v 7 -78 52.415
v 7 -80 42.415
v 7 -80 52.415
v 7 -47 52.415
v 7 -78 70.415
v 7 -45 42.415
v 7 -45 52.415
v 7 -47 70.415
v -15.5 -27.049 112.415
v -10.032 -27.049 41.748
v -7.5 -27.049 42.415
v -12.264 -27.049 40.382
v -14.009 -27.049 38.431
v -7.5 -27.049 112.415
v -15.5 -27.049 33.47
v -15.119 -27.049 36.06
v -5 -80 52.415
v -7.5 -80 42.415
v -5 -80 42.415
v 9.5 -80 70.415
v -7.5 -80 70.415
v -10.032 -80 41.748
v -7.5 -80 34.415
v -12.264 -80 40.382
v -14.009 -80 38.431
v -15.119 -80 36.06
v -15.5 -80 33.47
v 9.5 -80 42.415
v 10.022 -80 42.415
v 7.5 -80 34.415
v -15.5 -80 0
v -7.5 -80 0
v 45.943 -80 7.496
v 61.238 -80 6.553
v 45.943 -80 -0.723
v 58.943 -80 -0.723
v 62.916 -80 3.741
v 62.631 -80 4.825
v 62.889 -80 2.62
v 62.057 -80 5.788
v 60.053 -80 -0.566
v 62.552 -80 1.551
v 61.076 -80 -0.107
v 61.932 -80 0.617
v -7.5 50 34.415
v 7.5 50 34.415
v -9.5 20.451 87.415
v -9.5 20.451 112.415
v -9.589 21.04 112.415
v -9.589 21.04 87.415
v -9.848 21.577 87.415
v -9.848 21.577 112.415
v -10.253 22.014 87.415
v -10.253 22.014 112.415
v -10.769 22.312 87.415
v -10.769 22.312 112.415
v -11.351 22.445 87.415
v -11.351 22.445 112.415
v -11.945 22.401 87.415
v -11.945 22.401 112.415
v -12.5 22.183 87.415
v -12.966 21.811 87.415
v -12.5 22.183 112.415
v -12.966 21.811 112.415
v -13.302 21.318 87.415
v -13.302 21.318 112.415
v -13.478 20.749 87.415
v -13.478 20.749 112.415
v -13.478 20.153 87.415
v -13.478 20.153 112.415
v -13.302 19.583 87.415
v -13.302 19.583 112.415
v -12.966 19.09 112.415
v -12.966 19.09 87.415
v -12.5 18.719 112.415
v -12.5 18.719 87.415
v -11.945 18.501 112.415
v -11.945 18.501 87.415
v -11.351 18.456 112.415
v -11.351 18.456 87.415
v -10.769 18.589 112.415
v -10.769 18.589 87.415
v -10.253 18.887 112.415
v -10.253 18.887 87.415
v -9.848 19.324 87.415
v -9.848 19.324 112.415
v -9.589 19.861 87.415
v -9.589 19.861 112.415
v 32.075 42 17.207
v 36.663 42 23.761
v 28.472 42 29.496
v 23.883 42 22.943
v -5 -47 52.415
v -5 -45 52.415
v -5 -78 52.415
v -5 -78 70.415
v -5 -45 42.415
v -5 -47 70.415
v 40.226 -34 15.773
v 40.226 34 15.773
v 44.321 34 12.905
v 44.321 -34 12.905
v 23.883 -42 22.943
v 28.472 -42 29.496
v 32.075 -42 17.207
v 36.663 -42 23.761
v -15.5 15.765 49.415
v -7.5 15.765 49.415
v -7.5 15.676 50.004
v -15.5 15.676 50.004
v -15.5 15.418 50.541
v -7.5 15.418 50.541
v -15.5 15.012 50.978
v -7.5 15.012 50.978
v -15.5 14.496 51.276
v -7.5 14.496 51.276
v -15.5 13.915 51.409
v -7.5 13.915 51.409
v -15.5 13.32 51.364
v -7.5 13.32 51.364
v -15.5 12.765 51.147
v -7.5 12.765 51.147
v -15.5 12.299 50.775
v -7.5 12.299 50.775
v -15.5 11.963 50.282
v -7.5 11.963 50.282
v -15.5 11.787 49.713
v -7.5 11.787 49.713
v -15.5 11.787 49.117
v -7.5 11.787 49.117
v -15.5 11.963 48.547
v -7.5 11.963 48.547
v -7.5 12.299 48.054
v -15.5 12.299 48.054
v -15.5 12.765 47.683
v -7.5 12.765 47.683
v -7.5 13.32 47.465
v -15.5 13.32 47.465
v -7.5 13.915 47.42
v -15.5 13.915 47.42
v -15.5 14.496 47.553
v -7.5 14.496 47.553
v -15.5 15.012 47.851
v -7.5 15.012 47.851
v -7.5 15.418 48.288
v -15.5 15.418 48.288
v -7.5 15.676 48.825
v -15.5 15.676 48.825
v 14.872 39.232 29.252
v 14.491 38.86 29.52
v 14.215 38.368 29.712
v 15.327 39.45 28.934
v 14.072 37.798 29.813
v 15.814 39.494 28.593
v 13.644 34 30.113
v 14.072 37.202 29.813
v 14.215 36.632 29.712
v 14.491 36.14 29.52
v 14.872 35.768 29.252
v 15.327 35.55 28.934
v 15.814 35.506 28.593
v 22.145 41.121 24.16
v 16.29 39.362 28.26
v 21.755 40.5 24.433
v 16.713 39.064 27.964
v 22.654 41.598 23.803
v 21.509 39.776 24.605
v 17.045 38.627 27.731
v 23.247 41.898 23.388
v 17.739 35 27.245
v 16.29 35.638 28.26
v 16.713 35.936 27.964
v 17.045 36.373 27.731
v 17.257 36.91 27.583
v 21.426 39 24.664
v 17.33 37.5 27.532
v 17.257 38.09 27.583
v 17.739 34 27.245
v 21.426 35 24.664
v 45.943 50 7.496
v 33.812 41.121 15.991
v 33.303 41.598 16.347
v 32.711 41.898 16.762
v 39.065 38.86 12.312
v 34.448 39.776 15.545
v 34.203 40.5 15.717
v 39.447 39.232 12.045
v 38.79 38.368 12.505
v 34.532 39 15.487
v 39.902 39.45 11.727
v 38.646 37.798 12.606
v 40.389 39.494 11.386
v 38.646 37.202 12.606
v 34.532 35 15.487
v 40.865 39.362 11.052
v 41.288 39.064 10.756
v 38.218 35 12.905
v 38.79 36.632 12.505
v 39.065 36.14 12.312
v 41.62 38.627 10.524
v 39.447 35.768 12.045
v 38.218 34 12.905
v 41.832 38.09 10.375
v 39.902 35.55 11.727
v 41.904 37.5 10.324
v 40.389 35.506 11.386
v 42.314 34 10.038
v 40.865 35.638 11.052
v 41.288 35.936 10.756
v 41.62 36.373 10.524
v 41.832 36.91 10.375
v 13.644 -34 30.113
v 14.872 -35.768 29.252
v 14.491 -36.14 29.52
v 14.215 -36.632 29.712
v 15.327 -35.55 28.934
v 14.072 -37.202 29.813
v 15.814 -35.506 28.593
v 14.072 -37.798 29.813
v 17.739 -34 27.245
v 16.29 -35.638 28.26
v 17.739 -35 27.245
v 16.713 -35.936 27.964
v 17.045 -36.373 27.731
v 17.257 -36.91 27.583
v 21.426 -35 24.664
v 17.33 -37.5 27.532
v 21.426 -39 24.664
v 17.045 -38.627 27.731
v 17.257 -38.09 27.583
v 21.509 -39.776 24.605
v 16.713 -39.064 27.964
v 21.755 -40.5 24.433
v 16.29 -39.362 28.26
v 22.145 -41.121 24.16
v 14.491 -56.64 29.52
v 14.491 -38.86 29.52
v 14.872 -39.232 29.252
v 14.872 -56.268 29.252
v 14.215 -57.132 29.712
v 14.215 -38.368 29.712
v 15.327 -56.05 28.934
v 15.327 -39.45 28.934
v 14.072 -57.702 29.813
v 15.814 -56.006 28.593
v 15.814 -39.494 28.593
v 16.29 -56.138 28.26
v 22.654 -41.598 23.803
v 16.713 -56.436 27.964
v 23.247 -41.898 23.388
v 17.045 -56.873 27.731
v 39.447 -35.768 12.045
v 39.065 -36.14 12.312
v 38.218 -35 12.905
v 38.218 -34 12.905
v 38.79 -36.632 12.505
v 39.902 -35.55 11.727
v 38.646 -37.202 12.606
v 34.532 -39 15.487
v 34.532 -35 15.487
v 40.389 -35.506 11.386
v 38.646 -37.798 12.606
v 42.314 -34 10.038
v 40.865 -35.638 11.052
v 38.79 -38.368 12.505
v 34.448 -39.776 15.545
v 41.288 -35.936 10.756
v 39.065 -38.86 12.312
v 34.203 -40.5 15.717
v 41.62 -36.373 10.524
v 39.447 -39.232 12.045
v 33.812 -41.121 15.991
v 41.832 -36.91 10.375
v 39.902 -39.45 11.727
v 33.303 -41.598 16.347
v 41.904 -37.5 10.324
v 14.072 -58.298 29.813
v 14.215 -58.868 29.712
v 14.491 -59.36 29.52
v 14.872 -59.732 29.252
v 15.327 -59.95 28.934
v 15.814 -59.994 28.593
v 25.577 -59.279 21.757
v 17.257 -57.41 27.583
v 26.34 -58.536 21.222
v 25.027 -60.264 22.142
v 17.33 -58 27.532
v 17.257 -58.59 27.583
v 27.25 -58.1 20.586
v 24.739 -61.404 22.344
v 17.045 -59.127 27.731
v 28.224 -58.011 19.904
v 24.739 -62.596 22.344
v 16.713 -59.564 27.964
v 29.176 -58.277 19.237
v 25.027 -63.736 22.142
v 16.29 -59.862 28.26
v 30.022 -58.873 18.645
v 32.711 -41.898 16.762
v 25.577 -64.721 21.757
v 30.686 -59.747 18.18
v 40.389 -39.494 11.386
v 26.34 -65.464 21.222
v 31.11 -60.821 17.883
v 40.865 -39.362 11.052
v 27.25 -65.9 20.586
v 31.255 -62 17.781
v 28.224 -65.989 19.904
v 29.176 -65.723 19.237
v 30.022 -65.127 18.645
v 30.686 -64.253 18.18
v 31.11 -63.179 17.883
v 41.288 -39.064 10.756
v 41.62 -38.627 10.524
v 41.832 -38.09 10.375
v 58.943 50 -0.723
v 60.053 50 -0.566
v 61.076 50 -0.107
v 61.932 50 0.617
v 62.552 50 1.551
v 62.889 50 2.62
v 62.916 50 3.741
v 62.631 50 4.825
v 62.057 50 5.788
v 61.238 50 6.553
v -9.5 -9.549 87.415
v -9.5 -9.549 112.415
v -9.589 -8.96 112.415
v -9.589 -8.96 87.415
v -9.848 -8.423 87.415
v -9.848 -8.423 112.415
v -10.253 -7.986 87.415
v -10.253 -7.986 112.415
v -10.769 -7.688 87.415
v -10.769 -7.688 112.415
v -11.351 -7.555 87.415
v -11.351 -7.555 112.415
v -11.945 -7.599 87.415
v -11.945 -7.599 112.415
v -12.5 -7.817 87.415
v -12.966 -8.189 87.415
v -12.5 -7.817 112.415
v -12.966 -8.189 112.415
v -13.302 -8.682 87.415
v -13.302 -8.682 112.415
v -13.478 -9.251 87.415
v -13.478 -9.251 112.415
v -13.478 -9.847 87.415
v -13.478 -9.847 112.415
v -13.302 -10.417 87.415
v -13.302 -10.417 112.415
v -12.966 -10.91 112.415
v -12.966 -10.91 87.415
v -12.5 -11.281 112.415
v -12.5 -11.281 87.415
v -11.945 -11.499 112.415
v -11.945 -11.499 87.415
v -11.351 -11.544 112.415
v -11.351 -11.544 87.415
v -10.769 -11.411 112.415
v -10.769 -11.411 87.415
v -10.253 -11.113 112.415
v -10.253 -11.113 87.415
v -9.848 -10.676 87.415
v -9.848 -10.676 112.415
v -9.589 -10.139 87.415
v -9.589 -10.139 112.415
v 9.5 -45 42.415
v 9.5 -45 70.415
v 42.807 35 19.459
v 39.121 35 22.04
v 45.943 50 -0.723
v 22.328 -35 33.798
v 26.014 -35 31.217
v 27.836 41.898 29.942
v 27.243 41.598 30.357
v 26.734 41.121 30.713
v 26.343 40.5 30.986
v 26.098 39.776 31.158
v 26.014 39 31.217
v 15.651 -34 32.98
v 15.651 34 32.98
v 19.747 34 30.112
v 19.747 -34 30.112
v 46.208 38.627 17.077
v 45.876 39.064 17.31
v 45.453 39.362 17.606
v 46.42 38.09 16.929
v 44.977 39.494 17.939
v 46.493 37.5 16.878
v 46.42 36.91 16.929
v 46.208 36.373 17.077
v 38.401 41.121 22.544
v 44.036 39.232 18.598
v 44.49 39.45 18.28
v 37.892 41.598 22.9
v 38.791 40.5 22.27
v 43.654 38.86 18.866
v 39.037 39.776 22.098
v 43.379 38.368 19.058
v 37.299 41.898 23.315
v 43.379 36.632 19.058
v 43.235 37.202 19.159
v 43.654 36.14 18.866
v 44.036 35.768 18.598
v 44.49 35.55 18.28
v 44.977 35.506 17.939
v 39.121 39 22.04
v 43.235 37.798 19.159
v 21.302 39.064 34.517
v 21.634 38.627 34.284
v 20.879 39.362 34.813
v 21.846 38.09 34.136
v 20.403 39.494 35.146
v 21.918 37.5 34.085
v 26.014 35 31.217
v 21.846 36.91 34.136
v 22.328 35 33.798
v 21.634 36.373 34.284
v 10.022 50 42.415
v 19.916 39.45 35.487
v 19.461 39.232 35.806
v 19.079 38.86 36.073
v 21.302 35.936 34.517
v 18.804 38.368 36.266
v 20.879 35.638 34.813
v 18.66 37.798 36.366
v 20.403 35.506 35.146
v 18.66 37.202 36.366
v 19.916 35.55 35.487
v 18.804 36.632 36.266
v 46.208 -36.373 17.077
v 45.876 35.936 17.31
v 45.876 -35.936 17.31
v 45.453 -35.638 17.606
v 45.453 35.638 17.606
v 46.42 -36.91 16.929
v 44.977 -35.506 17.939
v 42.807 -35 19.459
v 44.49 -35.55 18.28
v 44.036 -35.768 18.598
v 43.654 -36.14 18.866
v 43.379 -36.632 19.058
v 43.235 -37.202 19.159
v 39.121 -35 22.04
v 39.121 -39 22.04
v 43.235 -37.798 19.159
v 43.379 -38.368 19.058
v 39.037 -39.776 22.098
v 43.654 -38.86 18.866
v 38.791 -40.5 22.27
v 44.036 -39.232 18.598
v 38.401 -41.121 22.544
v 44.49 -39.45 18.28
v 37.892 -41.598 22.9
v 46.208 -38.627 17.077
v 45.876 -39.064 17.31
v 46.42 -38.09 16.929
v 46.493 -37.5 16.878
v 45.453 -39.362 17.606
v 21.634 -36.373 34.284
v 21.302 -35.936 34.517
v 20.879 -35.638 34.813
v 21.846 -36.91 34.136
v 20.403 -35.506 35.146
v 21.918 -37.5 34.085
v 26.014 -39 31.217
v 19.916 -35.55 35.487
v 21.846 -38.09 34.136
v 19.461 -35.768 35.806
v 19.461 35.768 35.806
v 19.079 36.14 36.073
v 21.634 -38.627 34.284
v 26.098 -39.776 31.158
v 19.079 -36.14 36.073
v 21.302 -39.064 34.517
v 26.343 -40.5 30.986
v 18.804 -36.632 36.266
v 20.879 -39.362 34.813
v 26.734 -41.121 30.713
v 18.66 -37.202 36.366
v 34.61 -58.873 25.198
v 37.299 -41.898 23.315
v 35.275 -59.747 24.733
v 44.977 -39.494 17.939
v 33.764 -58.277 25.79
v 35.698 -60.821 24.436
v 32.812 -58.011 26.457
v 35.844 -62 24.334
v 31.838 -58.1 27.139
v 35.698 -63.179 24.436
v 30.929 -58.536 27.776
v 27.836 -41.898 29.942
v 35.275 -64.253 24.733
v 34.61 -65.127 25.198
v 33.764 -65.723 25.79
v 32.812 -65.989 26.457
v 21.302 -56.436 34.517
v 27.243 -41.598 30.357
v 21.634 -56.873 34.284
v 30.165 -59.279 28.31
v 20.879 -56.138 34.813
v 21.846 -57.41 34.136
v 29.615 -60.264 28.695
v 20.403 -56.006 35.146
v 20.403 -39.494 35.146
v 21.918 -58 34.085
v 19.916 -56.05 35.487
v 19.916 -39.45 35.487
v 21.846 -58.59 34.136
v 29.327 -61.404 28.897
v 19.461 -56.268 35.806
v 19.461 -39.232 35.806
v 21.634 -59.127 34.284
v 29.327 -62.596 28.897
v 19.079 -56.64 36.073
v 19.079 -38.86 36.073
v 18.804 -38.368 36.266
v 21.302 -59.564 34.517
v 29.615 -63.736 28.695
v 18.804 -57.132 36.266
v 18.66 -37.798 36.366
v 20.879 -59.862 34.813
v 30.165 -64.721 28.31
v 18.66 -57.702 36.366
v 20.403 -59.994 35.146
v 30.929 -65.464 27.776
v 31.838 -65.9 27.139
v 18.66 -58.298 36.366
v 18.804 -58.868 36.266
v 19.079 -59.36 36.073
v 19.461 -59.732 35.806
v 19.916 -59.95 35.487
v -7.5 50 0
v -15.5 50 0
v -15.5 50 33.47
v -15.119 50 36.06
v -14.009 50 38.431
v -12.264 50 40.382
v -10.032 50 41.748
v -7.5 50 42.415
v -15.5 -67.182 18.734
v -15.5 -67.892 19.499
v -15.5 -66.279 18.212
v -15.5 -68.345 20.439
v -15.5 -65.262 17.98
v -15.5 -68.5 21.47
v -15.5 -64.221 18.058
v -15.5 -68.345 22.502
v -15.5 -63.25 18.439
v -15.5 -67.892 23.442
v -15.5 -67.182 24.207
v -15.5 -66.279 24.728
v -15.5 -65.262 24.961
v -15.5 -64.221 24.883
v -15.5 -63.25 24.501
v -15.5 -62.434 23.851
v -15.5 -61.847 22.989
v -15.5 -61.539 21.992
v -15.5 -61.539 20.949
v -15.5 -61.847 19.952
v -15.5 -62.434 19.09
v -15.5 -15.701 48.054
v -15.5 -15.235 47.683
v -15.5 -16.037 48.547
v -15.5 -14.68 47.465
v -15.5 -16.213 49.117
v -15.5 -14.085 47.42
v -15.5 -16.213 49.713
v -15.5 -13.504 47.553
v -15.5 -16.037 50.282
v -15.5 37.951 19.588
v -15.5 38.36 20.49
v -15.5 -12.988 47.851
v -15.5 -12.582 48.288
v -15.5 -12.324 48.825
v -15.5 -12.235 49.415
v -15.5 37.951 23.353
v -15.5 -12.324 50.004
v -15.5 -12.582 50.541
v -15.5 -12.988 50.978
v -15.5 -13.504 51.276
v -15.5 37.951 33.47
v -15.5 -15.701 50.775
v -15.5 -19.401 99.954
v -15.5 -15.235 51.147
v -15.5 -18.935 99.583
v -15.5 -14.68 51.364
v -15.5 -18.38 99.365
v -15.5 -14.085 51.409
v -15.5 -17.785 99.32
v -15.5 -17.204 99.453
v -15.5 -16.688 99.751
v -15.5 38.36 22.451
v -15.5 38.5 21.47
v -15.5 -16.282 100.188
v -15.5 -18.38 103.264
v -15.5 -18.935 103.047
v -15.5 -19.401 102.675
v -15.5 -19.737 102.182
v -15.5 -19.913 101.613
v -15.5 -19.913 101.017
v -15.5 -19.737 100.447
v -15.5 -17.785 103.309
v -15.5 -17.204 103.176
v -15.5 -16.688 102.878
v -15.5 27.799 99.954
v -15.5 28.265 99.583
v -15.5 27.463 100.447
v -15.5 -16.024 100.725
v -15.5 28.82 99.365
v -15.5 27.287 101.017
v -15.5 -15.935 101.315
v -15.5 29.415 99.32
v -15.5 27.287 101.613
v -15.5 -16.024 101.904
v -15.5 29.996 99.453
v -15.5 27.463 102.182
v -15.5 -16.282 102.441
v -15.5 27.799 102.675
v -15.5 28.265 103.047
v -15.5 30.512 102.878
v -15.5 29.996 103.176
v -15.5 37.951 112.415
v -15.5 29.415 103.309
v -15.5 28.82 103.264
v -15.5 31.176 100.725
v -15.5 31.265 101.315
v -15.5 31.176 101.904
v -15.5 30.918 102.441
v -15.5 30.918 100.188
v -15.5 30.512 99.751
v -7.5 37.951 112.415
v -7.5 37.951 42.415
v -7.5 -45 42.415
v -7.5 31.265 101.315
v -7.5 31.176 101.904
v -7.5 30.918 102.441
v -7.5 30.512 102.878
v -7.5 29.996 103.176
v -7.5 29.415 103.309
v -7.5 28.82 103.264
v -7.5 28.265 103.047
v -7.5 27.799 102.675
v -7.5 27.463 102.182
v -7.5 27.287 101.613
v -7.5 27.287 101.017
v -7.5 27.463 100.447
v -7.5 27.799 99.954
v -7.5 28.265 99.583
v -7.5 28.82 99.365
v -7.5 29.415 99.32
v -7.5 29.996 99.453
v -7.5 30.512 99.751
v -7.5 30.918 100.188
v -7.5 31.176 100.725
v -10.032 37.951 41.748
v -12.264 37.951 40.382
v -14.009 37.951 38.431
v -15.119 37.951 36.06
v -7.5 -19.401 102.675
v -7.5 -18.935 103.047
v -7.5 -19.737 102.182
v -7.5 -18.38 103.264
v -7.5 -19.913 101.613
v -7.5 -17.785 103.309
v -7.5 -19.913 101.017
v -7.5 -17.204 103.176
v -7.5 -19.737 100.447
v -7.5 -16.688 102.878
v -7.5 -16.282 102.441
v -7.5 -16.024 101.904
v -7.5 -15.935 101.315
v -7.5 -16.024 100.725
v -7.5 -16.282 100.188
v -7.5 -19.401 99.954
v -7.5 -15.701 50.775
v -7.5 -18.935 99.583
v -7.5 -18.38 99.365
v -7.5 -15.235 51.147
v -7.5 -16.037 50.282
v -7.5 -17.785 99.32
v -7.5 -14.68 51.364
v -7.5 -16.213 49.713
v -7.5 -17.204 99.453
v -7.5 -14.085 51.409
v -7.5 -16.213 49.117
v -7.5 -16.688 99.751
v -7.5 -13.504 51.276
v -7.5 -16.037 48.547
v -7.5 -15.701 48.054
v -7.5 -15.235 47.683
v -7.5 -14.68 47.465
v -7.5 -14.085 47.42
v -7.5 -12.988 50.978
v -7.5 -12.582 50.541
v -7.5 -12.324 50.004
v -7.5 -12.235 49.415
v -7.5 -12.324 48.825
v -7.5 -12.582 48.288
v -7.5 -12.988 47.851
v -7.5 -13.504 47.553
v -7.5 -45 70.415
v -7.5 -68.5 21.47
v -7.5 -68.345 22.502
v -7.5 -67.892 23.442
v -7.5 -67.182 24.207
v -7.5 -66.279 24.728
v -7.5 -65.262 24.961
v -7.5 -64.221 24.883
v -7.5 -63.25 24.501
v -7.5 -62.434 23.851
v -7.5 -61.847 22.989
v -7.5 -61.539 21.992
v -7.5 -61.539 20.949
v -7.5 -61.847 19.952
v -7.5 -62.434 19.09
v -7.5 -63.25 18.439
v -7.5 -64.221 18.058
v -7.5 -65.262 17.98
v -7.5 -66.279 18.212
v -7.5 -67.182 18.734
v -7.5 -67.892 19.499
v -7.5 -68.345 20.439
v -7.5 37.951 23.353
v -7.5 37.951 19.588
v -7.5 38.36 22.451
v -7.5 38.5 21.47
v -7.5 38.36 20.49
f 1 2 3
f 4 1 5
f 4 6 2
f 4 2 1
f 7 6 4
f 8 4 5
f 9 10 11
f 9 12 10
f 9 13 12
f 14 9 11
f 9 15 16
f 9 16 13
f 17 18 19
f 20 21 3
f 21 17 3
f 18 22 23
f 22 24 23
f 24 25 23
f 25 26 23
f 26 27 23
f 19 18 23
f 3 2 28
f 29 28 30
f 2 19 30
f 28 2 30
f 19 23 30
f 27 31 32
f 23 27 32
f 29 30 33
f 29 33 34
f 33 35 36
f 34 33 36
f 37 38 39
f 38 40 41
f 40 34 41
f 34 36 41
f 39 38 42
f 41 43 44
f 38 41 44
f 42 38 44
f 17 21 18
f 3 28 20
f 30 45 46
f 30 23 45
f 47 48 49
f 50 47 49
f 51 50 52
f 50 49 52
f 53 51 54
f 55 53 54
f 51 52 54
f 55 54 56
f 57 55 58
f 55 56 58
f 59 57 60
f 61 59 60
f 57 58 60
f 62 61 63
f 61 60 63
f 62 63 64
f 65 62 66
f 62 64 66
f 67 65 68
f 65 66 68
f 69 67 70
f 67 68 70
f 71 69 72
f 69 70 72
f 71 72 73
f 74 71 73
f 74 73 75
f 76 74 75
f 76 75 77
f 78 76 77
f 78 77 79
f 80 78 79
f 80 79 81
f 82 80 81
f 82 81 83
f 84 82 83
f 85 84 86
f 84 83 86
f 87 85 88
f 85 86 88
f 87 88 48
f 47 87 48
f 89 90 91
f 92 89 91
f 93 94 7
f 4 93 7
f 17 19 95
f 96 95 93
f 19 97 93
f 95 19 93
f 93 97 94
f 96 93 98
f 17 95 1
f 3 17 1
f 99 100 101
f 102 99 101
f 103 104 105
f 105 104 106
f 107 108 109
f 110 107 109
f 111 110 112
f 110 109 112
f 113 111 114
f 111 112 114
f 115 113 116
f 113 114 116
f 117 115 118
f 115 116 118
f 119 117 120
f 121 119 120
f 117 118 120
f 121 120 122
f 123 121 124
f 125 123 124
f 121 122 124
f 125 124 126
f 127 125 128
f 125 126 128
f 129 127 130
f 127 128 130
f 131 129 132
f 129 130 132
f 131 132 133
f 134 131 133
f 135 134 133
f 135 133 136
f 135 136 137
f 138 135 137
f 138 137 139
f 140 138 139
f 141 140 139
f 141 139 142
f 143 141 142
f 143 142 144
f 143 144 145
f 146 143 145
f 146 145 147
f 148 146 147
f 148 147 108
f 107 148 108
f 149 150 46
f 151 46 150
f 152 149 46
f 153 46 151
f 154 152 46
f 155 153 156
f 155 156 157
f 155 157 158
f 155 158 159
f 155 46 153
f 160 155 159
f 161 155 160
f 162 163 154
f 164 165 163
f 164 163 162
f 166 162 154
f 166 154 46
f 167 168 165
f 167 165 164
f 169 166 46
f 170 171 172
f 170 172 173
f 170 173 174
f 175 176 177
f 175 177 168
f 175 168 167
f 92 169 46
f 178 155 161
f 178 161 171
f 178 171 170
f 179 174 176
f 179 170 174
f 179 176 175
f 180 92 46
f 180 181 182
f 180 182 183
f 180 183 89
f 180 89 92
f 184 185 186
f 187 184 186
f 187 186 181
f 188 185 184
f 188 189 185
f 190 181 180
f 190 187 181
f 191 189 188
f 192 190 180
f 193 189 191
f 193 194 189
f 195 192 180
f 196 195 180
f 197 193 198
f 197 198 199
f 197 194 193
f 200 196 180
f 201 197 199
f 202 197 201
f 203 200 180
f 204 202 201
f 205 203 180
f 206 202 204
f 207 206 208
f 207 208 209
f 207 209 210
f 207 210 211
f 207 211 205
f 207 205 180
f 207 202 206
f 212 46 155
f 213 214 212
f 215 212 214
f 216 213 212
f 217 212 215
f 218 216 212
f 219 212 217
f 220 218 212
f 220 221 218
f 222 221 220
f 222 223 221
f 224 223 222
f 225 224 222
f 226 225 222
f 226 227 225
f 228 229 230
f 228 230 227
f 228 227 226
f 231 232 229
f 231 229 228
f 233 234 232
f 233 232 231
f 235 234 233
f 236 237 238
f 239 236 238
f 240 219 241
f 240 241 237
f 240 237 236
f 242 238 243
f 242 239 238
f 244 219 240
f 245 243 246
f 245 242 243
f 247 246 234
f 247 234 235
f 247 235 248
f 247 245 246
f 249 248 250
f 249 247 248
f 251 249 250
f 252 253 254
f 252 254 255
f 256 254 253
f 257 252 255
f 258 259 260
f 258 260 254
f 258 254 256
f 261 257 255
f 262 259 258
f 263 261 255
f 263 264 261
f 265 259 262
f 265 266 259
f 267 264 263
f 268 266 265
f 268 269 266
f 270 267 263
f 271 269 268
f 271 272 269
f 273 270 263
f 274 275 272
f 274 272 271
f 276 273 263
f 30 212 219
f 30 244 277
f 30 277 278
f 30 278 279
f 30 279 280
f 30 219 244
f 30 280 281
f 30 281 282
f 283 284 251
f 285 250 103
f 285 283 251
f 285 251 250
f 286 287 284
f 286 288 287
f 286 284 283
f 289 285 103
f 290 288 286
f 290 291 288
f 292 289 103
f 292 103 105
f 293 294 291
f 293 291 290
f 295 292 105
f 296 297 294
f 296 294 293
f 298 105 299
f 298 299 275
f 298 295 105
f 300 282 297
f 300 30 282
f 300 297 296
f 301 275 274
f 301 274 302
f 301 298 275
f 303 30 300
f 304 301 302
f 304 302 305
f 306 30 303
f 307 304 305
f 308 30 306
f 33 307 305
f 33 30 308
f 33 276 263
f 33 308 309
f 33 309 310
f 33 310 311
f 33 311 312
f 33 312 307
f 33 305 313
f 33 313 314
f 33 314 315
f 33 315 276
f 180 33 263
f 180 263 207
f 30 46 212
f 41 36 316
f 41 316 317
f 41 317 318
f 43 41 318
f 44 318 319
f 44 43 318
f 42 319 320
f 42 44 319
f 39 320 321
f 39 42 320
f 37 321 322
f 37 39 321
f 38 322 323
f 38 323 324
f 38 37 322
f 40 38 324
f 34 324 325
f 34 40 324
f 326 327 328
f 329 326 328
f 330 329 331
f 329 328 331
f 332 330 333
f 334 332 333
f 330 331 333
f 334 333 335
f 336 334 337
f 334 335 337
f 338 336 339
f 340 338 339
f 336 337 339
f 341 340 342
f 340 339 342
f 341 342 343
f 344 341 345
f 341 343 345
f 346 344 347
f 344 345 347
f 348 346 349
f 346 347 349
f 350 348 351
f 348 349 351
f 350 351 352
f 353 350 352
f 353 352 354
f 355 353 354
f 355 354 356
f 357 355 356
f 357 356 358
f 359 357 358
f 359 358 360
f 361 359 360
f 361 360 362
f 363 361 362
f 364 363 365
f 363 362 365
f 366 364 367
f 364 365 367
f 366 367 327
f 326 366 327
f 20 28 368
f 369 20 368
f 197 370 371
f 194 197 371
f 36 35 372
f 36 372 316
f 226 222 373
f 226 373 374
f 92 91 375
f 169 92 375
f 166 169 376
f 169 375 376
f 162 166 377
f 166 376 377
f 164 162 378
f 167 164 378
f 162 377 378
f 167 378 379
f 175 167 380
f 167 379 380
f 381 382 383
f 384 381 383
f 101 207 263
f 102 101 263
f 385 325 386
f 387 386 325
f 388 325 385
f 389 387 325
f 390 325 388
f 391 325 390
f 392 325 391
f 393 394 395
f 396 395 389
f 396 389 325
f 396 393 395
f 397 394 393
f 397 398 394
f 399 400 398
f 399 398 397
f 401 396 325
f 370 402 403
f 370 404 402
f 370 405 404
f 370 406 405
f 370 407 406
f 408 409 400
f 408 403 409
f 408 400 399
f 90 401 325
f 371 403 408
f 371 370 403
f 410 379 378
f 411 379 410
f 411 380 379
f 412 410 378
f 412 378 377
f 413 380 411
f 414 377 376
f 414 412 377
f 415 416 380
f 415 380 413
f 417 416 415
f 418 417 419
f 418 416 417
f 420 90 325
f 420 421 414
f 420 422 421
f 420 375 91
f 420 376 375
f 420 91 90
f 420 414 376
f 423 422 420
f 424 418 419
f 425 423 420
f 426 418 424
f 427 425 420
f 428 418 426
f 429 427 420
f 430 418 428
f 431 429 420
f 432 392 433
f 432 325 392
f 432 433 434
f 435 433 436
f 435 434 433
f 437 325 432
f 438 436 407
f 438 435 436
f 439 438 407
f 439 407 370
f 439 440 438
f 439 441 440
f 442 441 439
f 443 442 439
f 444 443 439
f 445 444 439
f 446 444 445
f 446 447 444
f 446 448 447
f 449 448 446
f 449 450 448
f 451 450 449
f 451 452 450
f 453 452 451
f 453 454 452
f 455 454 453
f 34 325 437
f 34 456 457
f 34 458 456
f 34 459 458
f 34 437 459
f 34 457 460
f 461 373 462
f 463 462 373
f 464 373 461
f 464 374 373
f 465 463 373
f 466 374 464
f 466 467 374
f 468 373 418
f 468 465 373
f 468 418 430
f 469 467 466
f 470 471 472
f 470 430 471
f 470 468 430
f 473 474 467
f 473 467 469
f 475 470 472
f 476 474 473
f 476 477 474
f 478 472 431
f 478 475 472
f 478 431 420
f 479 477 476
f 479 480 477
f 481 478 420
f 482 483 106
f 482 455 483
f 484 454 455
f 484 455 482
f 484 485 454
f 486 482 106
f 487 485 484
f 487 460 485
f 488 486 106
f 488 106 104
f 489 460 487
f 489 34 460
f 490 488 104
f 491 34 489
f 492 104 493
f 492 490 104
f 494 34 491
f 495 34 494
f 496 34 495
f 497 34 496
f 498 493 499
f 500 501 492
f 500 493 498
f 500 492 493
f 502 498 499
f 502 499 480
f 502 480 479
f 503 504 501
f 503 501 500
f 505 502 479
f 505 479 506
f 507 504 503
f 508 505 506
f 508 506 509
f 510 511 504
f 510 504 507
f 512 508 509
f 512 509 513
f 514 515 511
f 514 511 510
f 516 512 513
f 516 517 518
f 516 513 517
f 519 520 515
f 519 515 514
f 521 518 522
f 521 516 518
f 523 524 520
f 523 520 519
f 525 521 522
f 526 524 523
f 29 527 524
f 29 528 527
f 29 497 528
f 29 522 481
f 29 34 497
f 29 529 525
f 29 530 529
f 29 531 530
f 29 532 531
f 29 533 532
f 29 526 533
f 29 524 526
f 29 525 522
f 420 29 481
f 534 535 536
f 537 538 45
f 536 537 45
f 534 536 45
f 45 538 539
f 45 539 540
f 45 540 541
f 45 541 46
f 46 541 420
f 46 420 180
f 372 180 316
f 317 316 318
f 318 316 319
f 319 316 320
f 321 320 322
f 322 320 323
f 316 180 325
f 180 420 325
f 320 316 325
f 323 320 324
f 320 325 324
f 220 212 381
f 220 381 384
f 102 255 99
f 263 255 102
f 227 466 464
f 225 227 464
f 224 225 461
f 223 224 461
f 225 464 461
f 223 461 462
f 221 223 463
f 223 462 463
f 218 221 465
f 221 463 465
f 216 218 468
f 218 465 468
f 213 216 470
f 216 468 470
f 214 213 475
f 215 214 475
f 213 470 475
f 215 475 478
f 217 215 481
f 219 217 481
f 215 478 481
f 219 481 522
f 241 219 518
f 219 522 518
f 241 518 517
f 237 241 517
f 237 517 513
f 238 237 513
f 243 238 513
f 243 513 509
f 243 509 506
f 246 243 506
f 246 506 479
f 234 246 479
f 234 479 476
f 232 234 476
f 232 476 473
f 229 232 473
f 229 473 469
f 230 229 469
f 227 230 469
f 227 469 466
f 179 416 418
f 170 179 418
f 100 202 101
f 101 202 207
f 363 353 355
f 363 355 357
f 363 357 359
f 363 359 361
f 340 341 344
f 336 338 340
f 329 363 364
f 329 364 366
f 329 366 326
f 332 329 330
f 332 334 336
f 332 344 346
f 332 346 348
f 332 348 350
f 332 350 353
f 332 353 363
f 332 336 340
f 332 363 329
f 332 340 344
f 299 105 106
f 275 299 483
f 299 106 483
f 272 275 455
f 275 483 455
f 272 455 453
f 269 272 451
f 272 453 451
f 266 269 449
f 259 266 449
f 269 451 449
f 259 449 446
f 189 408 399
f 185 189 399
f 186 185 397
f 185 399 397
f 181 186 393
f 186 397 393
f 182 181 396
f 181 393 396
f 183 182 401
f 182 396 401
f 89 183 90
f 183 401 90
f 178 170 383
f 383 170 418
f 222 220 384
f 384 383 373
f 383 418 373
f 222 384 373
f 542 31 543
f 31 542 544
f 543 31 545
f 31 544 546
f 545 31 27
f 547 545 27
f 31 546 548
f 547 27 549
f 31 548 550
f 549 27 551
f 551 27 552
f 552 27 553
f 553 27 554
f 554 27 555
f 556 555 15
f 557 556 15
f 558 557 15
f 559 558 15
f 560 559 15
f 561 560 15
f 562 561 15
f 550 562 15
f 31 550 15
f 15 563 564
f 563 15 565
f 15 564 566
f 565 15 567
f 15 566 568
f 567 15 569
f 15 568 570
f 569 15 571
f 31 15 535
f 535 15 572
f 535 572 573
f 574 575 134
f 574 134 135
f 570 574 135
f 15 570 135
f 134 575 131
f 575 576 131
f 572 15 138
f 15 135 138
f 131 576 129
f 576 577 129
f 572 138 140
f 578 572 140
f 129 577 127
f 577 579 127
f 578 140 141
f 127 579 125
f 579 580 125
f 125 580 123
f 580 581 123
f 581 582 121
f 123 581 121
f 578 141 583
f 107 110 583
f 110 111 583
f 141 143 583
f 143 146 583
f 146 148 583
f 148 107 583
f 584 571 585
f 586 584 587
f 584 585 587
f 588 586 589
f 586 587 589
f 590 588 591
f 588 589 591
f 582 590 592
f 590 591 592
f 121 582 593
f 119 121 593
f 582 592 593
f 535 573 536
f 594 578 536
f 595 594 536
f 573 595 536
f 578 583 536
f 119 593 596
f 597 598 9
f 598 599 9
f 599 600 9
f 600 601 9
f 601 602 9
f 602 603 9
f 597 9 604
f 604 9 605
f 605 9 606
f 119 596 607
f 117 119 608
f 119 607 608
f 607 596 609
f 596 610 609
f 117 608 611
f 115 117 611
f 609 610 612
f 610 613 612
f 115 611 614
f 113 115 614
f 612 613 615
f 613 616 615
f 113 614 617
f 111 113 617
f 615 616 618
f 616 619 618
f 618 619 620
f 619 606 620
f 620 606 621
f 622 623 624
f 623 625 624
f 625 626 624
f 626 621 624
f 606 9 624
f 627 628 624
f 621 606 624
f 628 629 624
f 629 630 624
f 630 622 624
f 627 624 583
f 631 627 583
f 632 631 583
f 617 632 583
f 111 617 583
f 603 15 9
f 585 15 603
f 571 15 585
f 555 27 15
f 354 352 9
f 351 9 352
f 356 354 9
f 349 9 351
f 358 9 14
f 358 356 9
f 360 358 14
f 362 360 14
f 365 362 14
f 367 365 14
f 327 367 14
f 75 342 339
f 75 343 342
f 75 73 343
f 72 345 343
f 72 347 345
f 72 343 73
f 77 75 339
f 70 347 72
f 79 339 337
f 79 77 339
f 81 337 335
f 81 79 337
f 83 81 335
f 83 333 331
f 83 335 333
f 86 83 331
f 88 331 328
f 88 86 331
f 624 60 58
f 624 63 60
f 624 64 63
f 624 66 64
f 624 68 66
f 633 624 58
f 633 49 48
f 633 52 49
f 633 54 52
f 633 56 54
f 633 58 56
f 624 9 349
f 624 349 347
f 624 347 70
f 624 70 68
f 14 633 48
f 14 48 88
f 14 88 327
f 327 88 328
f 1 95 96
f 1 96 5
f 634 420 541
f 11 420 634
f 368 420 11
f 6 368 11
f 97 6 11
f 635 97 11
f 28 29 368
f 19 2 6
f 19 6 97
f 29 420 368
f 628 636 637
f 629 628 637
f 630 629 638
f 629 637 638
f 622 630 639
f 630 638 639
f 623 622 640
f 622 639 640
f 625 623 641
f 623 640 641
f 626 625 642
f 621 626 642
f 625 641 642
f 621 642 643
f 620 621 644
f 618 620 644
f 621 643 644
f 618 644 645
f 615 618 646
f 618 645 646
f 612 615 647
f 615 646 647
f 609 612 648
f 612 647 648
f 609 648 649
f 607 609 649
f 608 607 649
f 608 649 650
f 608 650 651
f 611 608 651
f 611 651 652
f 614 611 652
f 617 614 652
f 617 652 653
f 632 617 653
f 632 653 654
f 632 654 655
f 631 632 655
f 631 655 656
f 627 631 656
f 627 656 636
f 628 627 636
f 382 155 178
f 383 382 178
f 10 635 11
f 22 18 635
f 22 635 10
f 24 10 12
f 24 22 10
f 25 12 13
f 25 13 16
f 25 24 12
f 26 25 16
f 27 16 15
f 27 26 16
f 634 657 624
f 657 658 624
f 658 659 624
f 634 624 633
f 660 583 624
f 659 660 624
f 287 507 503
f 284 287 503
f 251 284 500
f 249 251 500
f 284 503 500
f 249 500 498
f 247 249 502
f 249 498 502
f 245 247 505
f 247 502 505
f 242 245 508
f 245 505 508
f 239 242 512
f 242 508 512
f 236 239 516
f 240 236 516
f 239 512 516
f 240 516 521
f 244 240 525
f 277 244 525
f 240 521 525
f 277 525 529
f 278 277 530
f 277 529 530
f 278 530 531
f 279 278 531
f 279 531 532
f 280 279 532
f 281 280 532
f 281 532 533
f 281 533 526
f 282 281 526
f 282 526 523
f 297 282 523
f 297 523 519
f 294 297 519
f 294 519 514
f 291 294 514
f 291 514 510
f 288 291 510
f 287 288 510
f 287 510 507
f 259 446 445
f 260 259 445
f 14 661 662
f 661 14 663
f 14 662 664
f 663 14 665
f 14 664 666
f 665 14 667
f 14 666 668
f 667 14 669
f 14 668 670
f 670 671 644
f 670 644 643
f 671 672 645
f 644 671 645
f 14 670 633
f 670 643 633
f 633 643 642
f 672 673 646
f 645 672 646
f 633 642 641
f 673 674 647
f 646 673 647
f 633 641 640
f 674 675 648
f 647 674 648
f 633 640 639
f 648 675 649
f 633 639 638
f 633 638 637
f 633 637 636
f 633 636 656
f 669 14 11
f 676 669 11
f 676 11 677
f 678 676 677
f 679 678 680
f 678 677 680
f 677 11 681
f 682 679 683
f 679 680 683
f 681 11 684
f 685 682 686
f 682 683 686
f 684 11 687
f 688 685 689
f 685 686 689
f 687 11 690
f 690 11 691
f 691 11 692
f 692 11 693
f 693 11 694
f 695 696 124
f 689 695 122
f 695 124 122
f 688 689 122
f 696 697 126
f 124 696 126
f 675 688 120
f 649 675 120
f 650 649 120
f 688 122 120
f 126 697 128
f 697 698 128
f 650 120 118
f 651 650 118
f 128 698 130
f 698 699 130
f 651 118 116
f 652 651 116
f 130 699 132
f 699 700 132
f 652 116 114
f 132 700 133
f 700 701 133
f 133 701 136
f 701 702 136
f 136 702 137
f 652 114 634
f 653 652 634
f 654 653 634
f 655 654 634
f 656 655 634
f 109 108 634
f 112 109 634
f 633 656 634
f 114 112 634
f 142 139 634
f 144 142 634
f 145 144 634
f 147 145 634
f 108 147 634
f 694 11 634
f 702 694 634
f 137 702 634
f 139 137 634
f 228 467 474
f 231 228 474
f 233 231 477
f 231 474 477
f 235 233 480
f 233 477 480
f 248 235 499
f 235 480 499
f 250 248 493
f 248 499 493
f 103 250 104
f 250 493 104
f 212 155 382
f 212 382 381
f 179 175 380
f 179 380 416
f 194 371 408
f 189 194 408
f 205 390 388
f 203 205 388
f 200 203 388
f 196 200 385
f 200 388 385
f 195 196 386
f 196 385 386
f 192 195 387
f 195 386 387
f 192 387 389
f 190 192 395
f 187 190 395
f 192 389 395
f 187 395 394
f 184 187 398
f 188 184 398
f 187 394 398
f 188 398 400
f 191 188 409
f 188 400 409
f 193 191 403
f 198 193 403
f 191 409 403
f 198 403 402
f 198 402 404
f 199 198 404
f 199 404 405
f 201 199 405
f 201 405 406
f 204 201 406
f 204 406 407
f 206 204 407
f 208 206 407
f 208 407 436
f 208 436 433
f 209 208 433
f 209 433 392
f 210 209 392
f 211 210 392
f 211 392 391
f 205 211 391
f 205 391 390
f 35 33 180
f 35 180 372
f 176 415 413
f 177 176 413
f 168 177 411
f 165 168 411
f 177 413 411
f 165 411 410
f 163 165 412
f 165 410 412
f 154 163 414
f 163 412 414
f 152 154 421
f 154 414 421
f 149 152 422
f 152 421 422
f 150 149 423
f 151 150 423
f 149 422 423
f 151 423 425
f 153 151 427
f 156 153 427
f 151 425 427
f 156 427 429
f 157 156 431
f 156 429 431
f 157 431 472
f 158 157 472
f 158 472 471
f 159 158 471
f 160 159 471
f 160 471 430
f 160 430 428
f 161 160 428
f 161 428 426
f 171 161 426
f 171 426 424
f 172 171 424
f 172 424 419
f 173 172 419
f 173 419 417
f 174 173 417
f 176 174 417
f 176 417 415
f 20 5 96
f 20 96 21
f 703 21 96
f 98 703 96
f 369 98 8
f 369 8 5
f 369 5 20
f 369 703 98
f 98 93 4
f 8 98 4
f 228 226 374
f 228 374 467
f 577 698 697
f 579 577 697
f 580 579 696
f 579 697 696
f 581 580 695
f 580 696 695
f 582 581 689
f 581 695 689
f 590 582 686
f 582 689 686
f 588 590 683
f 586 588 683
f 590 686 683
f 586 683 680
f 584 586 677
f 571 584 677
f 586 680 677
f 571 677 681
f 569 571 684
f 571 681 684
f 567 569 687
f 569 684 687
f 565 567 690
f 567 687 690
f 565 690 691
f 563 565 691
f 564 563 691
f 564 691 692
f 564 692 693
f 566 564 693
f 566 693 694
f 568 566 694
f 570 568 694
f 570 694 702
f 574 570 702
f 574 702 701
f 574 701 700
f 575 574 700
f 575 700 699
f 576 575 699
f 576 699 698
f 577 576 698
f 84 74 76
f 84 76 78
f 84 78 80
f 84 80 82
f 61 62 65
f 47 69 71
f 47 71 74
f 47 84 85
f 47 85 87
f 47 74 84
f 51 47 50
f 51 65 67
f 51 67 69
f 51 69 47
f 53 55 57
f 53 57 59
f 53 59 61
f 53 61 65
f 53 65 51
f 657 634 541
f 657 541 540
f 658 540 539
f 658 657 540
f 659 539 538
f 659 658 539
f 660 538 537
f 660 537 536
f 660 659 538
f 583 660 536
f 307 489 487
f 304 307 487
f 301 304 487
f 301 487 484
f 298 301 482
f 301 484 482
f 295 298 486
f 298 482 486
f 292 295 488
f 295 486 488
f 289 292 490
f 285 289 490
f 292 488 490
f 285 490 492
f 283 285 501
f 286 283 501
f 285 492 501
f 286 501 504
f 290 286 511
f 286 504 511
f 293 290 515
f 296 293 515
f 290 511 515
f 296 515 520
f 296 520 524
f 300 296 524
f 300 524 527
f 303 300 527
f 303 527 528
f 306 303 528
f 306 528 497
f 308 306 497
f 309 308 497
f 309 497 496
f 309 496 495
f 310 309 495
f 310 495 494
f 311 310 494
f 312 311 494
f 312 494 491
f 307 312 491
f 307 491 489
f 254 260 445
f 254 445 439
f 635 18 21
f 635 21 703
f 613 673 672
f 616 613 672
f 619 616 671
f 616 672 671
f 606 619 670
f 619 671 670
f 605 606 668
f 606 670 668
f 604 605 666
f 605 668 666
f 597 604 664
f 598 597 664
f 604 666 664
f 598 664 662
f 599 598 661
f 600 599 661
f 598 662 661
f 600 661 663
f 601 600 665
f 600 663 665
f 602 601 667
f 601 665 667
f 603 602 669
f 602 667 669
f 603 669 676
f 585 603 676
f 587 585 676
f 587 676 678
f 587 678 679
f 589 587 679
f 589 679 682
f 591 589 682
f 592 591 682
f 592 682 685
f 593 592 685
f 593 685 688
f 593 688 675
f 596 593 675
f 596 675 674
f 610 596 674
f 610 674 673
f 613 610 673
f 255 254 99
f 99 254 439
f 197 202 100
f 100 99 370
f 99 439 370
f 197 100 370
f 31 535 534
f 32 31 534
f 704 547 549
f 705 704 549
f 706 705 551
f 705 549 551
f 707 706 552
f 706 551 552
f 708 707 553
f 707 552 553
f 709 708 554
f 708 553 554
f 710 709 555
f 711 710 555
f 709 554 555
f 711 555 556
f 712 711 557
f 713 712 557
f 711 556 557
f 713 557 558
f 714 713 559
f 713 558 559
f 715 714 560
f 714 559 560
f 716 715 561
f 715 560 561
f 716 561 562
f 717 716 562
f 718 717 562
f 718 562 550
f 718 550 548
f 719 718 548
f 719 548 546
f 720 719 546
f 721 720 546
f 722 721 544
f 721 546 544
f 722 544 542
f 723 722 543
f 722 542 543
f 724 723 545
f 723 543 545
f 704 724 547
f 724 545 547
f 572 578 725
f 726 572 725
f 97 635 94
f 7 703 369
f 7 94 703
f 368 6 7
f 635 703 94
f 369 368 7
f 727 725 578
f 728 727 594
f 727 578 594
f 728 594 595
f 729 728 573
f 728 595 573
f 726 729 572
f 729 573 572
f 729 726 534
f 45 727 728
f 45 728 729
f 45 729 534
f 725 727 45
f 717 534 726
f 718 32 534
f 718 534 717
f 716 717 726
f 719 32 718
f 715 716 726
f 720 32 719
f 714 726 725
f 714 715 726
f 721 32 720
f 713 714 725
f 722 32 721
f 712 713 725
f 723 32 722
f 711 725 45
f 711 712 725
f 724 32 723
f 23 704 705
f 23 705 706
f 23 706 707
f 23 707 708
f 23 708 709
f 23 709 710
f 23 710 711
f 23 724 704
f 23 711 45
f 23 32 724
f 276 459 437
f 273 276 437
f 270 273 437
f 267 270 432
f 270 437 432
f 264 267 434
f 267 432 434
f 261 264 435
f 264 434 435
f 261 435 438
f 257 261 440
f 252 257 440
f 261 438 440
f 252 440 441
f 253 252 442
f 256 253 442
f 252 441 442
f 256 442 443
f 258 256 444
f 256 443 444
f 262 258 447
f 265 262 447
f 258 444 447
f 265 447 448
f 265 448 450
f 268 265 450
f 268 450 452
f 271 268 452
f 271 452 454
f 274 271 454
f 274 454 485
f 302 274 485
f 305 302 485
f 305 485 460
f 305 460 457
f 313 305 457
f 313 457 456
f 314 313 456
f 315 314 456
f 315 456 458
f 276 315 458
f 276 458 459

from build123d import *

# Parameters (mm, degrees)
F1_DEPTH       = 80
F1_DEPTH_BACK  = 50
F2_R           = 2
F3_DEPTH       = 25
F4_W           = 17
F4_H           = 35
F4_W_2         = 12
F4_H_2         = 31
F5_DEPTH       = 28
F6_W           = 6
F6_H           = 10
F7_DEPTH       = 35.001
F8_R           = 4
F8_R_2         = 2
F9_DEPTH       = 25
F10_R          = 3.5
F11_DEPTH      = 8
F12_W          = 8
F12_H          = 65
F13_DEPTH      = 70
F13_DEPTH_BACK = 25
F14_R          = 2
F15_DEPTH      = 25
F16_R          = 2
F17_DEPTH      = 25
F18_W          = 35
F18_H          = 68
F19_DEPTH      = 3.5


with BuildPart() as f1:
    # F0 (on Front) → F1 (new body, two sides)
    with BuildSketch(Plane.XZ) as f1_sk:
        with BuildLine():
            Line((7.5, 34.4145861811), (45.9434284027, 7.4962078188))
            Line((45.9434284027, 7.4962078188), (45.9434284027, -0.7233918228))
            Line((45.9434284027, -0.7233918228), (58.9434284027, -0.7233918228))
            ThreePointArc((58.9434284027, -0.7233918228), (62.7582962057, 2.0737849791), (61.2377341481, 6.5532163543))
            Line((61.2377341481, 6.5532163543), (10.022390311, 42.4145861811))
            Line((10.022390311, 42.4145861811), (-7.5, 42.4145861811))
            ThreePointArc((-7.5, 42.4145861811), (-13.2082039325, 39.4703142711), (-15.5, 33.4703142711))
            Line((-15.5, 33.4703142711), (-15.5, 0))
            Line((-15.5, 0), (-7.5, 0))
            Line((-7.5, 0), (-7.5, 34.4145861811))
            Line((-7.5, 34.4145861811), (7.5, 34.4145861811))
        make_face()
    extrude(amount=F1_DEPTH)
    extrude(f1_sk.sketch, amount=-F1_DEPTH_BACK)

    # F2 (on face) → F3 (cut)
    with BuildSketch(Plane(origin=(23.2256022942, 0, 33.1695976219), x_dir=(0.8191520443, 0, -0.5735764364), z_dir=(0.5735764364, 0, 0.8191520443))):
        with BuildLine():
            Line((-1.0957553681, 35), (-1.0957553681, -35))
            Line((-1.0957553681, -35), (3.4042446319, -35))
            Line((3.4042446319, -35), (3.4042446319, -39))
            ThreePointArc((3.4042446319, -39), (4.2829242884, -41.1213203436), (6.4042446319, -42))
            Line((6.4042446319, -42), (16.4042446319, -42))
            ThreePointArc((16.4042446319, -42), (18.5255649755, -41.1213203436), (19.4042446319, -39))
            Line((19.4042446319, -39), (19.4042446319, -35))
            Line((19.4042446319, -35), (23.9042446319, -35))
            Line((23.9042446319, -35), (23.9042446319, 35))
            Line((23.9042446319, 35), (19.4042446319, 35))
            Line((19.4042446319, 35), (3.4042446319, 35))
            Line((3.4042446319, 35), (-1.0957553681, 35))
        make_face()
        with BuildLine():
            Line((3.4042446319, 35.0351855159), (3.4042446319, 35))
            Line((3.4042446319, 35), (19.4042446319, 35))
            Line((19.4042446319, 35), (19.4042446319, 39))
            ThreePointArc((19.4042446319, 39), (18.5255649755, 41.1213203436), (16.4042446319, 42))
            Line((16.4042446319, 42), (6.4042446319, 42))
            ThreePointArc((6.4042446319, 42), (4.2829242884, 41.1213203436), (3.4042446319, 39))
            Line((3.4042446319, 39), (3.4042446319, 35.0351855159))
        make_face()
        with Locations((-3.5957553681, -37.5)):
            Circle(F2_R)
        with Locations((-3.5957553681, 37.5)):
            Circle(F2_R)
        with Locations((26.4042446319, 37.5)):
            Circle(F2_R)
        with Locations((26.4042446319, -37.5)):
            Circle(F2_R)
    extrude(amount=-F3_DEPTH, mode=Mode.SUBTRACT)

    # F4 (on face) → F5 (join)
    with BuildSketch(Plane.XY.offset(42.4145861811)):
        with Locations((1, -62.5)):
            Rectangle(F4_W, F4_H)
        with Locations((1, -62.5)):
            Rectangle(F4_W_2, F4_H_2, mode=Mode.SUBTRACT)
    extrude(amount=F5_DEPTH)

    # F6 (on face) → F7 (cut, through all)
    with BuildSketch(Plane(origin=(0, -45, 0), x_dir=(-1, 0, 0), z_dir=(0, 1, 0))):
        with Locations((-4, 47.4145861811)):
            Rectangle(F6_W, F6_H)
        with Locations((2, 47.4145861811)):
            Rectangle(F6_W, F6_H)
    extrude(amount=-F7_DEPTH, mode=Mode.SUBTRACT)

    # F8 (on face) → F9 (cut)
    with BuildSketch(Plane(origin=(23.2256022942, 0, 33.1695976219), x_dir=(0.8191520443, 0, -0.5735764364), z_dir=(0.5735764364, 0, 0.8191520443))):
        with Locations((11.4042446319, -62)):
            Circle(F8_R)
        with Locations((-3.5957553681, -58)):
            Circle(F8_R_2)
    extrude(amount=-F9_DEPTH, mode=Mode.SUBTRACT)

    # F10 (on face) → F11 (cut, through all)
    with BuildSketch(Plane(origin=(-15.5, 0, 0), x_dir=(0, -1, 0), z_dir=(-1, 0, 0))):
        with Locations((-35, 21.4703142711)):
            Circle(F10_R)
        with Locations((65, 21.4703142711)):
            Circle(F10_R)
    extrude(amount=-F11_DEPTH, mode=Mode.SUBTRACT)

    # F12 (on face) → F13 (join, two sides)
    with BuildSketch(Plane.XY.offset(42.4145861811)) as f13_sk:
        with Locations((-11.5, 5.4507081211)):
            Rectangle(F12_W, F12_H)
    extrude(amount=F13_DEPTH)
    extrude(f13_sk.sketch, amount=-F13_DEPTH_BACK)

    # F14 (on face) → F15 (cut)
    with BuildSketch(Plane.XY.offset(112.4145861811)):
        with Locations((-11.5, -9.5492918789)):
            Circle(F14_R)
        with Locations((-11.5, 20.4507081211)):
            Circle(F14_R)
    extrude(amount=-F15_DEPTH, mode=Mode.SUBTRACT)

    # F16 (on face) → F17 (cut)
    with BuildSketch(Plane.YZ.offset(-7.5)):
        with Locations((13.7650537365, 49.4145861811)):
            Circle(F16_R)
        with Locations((-14.2349462635, 49.4145861811)):
            Circle(F16_R)
        with Locations((29.2650537365, 101.3145861811)):
            Circle(F16_R)
        with Locations((-17.9349462635, 101.3145861811)):
            Circle(F16_R)
    extrude(amount=-F17_DEPTH, mode=Mode.SUBTRACT)

    # F18 (on face) → F19 (cut)
    with BuildSketch(Plane(origin=(18.6369908034, 0, 26.6163812675), x_dir=(0.8191520443, 0, -0.5735764364), z_dir=(-0.5735764364, 0, -0.8191520443))):
        with Locations((11.4042446319, 0)):
            Rectangle(F18_W, F18_H)
    extrude(amount=-F19_DEPTH, mode=Mode.SUBTRACT)


solid = f1.part
